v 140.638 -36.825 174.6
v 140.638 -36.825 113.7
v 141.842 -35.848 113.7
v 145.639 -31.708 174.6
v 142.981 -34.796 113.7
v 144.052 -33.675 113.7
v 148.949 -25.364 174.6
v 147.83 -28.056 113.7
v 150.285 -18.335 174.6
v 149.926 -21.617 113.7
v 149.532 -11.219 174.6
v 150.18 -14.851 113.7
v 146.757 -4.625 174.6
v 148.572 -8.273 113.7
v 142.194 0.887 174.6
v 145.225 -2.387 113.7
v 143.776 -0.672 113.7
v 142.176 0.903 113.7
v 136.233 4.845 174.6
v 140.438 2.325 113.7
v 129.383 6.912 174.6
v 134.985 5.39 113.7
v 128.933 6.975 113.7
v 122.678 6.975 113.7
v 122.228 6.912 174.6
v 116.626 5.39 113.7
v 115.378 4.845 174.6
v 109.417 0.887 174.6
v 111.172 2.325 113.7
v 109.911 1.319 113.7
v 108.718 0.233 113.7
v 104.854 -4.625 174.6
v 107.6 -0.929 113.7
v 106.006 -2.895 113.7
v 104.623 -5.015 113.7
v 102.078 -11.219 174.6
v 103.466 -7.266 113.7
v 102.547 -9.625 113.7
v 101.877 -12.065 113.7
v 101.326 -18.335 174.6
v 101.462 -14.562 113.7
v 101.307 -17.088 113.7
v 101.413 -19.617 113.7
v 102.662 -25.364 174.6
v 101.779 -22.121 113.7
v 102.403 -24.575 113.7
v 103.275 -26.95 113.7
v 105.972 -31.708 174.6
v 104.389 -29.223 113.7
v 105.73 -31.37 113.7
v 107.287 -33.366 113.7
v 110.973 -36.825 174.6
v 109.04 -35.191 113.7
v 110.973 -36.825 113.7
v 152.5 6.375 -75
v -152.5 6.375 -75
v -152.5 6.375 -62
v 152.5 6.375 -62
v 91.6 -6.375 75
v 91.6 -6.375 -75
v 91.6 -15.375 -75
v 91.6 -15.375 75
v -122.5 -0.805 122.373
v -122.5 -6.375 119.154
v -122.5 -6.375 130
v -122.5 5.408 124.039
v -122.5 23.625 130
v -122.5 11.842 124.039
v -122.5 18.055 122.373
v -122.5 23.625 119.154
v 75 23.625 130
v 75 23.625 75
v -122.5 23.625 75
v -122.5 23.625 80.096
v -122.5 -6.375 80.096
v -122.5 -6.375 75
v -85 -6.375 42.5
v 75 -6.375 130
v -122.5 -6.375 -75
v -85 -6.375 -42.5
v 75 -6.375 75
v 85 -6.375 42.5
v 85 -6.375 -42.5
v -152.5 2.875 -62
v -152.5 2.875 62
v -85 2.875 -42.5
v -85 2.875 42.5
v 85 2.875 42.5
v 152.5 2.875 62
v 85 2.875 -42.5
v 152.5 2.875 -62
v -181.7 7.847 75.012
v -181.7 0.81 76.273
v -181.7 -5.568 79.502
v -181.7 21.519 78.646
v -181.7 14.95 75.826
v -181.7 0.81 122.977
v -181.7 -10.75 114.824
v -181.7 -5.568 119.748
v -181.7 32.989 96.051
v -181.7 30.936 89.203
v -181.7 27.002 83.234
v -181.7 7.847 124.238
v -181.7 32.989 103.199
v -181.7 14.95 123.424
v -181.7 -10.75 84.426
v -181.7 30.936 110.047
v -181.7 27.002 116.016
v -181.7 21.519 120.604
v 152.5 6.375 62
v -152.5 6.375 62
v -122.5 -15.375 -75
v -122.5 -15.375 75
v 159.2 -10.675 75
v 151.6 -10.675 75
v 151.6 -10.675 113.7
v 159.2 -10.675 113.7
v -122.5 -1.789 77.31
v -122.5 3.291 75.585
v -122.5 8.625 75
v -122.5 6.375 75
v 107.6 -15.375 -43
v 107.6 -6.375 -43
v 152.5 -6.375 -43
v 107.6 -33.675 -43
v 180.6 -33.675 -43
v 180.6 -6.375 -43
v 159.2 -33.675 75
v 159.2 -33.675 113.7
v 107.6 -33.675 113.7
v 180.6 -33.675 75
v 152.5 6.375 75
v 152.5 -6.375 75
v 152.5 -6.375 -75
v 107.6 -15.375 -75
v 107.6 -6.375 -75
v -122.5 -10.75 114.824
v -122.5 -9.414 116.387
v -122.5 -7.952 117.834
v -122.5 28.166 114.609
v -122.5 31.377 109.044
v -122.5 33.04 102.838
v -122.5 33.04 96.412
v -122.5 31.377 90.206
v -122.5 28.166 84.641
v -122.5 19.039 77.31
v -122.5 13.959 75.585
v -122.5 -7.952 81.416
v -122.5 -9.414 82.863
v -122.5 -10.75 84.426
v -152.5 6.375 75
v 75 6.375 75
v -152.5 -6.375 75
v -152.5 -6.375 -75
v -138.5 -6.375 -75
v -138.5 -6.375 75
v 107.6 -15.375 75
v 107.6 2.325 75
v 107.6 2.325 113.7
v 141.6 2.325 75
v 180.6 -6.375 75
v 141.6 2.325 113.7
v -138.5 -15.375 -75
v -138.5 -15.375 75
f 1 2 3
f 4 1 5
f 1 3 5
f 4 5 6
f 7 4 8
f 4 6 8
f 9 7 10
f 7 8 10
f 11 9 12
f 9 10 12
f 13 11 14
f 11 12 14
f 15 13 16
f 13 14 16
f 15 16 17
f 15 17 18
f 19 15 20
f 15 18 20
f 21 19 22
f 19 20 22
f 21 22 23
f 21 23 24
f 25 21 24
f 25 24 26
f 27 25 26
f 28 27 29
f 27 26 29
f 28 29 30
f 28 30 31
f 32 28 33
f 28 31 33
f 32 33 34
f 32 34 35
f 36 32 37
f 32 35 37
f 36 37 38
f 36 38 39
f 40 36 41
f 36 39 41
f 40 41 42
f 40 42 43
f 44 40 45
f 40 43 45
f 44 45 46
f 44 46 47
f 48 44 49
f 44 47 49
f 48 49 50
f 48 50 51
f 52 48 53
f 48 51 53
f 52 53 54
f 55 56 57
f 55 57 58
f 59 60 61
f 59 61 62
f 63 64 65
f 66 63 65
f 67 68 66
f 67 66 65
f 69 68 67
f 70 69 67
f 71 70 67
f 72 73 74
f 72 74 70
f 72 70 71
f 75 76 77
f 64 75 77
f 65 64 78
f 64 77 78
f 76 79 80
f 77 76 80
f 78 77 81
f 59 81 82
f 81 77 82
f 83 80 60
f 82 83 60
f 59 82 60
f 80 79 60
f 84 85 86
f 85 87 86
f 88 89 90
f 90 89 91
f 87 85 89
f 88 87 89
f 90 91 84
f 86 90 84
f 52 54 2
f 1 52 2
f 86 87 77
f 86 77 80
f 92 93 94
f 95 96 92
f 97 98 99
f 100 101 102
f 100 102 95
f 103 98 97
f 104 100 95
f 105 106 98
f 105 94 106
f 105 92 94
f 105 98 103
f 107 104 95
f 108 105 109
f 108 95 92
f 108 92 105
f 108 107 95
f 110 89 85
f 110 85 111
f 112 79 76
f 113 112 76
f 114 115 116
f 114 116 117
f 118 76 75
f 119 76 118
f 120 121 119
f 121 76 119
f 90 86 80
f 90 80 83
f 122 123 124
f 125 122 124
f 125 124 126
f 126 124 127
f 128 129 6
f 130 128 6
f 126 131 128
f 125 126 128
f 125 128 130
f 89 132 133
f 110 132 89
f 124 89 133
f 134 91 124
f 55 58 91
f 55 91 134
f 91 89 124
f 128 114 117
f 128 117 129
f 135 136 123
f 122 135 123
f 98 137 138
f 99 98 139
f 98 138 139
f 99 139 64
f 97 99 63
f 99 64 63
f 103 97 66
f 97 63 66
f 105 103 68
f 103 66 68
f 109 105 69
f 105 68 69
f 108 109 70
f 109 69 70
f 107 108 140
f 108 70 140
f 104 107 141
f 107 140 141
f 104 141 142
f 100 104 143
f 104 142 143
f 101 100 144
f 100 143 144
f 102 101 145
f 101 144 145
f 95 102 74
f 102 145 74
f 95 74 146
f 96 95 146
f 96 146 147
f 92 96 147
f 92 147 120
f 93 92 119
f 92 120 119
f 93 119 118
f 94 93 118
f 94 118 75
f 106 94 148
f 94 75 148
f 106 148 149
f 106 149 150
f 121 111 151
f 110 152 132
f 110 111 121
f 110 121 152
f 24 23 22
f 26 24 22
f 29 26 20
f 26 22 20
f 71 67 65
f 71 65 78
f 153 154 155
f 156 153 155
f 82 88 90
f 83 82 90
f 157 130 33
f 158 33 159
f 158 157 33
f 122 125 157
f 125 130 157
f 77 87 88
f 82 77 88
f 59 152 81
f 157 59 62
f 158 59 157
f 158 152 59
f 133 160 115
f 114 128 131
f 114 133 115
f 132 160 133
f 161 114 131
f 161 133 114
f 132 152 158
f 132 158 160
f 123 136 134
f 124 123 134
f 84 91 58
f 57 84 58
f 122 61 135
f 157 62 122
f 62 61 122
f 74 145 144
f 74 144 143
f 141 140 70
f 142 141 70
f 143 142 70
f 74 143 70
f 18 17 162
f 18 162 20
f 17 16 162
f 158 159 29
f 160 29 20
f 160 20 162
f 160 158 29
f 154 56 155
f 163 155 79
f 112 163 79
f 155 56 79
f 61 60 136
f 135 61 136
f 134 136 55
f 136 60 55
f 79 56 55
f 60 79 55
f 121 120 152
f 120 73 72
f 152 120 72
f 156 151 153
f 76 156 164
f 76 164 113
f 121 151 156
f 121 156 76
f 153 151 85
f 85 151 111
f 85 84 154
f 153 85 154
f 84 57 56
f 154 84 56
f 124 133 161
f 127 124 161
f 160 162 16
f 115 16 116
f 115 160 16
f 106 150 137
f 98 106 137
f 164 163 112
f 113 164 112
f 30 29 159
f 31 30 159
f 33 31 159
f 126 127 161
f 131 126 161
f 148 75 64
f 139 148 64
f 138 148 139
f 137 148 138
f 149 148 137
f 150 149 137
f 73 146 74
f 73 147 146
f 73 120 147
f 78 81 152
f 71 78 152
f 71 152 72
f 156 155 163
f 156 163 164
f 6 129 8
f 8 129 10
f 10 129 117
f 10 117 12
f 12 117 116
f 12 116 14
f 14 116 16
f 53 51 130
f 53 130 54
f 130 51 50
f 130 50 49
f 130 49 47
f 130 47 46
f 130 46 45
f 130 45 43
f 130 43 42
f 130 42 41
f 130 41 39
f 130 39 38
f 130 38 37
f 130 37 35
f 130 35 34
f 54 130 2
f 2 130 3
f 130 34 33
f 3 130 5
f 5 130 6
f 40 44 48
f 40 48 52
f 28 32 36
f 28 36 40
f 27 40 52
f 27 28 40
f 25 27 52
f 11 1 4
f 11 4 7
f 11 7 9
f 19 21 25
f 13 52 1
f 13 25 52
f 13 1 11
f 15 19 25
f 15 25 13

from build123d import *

# Parameters (mm, degrees)
SKETCH2_W           = 305
SKETCH2_H           = 150
BOSS_EXTRUDE1_DEPTH = 6.375
SKETCH3_W           = 124
SKETCH3_H           = 3.5
CUT_EXTRUDE1_DEPTH  = 306
SKETCH4_W           = 197.5
SKETCH4_H           = 30
BOSS_EXTRUDE2_DEPTH = 55
BOSS_EXTRUDE3_DEPTH = 59.2
SKETCH6_W           = 73
SKETCH6_H           = 118
BOSS_EXTRUDE4_DEPTH = 27.3
BOSS_EXTRUDE5_DEPTH = 38.7
BOSS_EXTRUDE6_DEPTH = 60.9
SKETCH9_W           = 16
SKETCH9_H           = 150
BOSS_EXTRUDE7_DEPTH = 9
SKETCH10_W          = 170
SKETCH10_H          = 85
CUT_EXTRUDE2_DEPTH  = 40.7


with BuildPart() as part:
    # Sketch2 → Boss-Extrude1 (new body, symmetric)
    with BuildSketch(Plane(origin=(0, 0, 0), x_dir=(1, 0, 0), z_dir=(0, 1, 0))):
        Rectangle(SKETCH2_W, SKETCH2_H)
    extrude(amount=BOSS_EXTRUDE1_DEPTH, both=True)

    # Sketch3 → Cut-Extrude1 (cut, through all)
    with BuildSketch(Plane(origin=(152.5, 0, 0), x_dir=(0, 0, -1), z_dir=(1, 0, 0))):
        with Locations((0, 4.625)):
            Rectangle(SKETCH3_W, SKETCH3_H)
    extrude(amount=-CUT_EXTRUDE1_DEPTH, mode=Mode.SUBTRACT)

    # Sketch4 → Boss-Extrude2 (add)
    with BuildSketch(Plane.XY.offset(75)):
        with Locations((-23.75, 8.625)):
            Rectangle(SKETCH4_W, SKETCH4_H)
    extrude(amount=BOSS_EXTRUDE2_DEPTH)

    # Sketch5 → Boss-Extrude3 (add)
    with BuildSketch(Plane.ZY.offset(122.5)):
        with BuildLine():
            Line((84.426315846, -10.75), (114.823684154, -10.75))
            ThreePointArc((114.823684154, -10.75), (99.625, 33.25), (84.426315846, -10.75))
        make_face()
    extrude(amount=BOSS_EXTRUDE3_DEPTH)

    # Sketch6 → Boss-Extrude4 (add)
    with BuildSketch(Plane.XZ.offset(6.375)):
        with Locations((144.1, 16)):
            Rectangle(SKETCH6_W, SKETCH6_H)
    extrude(amount=BOSS_EXTRUDE4_DEPTH)

    # Sketch7 → Boss-Extrude5 (add)
    with BuildSketch(Plane.XY.offset(75)):
        Polygon((107.6, -33.675), (107.6, 2.325), (141.6, 2.325), (151.6, -10.675), (159.2, -10.675), (159.2, -33.675), align=None)
    extrude(amount=BOSS_EXTRUDE5_DEPTH)

    # Sketch8 → Boss-Extrude6 (add)
    with BuildSketch(Plane.XY.offset(113.7)):
        with BuildLine():
            Line((110.972997108, -36.825), (140.637791056, -36.825))
            ThreePointArc((140.637791056, -36.825), (125.805394082, 7.175), (110.972997108, -36.825))
        make_face()
    extrude(amount=BOSS_EXTRUDE6_DEPTH)

    # Sketch9 → Boss-Extrude7 (add)
    with BuildSketch(Plane.XZ.offset(6.375)):
        with Locations((-130.5, 0)):
            Rectangle(SKETCH9_W, SKETCH9_H)
        with Locations((99.6, 0)):
            Rectangle(SKETCH9_W, SKETCH9_H)
    extrude(amount=BOSS_EXTRUDE7_DEPTH)

    # Sketch10 → Cut-Extrude2 (cut, through all)
    with BuildSketch(Plane(origin=(0, 2.875, 0), x_dir=(1, 0, 0), z_dir=(0, 1, 0))):
        Rectangle(SKETCH10_W, SKETCH10_H)
    extrude(amount=-CUT_EXTRUDE2_DEPTH, mode=Mode.SUBTRACT)


solid = part.part
